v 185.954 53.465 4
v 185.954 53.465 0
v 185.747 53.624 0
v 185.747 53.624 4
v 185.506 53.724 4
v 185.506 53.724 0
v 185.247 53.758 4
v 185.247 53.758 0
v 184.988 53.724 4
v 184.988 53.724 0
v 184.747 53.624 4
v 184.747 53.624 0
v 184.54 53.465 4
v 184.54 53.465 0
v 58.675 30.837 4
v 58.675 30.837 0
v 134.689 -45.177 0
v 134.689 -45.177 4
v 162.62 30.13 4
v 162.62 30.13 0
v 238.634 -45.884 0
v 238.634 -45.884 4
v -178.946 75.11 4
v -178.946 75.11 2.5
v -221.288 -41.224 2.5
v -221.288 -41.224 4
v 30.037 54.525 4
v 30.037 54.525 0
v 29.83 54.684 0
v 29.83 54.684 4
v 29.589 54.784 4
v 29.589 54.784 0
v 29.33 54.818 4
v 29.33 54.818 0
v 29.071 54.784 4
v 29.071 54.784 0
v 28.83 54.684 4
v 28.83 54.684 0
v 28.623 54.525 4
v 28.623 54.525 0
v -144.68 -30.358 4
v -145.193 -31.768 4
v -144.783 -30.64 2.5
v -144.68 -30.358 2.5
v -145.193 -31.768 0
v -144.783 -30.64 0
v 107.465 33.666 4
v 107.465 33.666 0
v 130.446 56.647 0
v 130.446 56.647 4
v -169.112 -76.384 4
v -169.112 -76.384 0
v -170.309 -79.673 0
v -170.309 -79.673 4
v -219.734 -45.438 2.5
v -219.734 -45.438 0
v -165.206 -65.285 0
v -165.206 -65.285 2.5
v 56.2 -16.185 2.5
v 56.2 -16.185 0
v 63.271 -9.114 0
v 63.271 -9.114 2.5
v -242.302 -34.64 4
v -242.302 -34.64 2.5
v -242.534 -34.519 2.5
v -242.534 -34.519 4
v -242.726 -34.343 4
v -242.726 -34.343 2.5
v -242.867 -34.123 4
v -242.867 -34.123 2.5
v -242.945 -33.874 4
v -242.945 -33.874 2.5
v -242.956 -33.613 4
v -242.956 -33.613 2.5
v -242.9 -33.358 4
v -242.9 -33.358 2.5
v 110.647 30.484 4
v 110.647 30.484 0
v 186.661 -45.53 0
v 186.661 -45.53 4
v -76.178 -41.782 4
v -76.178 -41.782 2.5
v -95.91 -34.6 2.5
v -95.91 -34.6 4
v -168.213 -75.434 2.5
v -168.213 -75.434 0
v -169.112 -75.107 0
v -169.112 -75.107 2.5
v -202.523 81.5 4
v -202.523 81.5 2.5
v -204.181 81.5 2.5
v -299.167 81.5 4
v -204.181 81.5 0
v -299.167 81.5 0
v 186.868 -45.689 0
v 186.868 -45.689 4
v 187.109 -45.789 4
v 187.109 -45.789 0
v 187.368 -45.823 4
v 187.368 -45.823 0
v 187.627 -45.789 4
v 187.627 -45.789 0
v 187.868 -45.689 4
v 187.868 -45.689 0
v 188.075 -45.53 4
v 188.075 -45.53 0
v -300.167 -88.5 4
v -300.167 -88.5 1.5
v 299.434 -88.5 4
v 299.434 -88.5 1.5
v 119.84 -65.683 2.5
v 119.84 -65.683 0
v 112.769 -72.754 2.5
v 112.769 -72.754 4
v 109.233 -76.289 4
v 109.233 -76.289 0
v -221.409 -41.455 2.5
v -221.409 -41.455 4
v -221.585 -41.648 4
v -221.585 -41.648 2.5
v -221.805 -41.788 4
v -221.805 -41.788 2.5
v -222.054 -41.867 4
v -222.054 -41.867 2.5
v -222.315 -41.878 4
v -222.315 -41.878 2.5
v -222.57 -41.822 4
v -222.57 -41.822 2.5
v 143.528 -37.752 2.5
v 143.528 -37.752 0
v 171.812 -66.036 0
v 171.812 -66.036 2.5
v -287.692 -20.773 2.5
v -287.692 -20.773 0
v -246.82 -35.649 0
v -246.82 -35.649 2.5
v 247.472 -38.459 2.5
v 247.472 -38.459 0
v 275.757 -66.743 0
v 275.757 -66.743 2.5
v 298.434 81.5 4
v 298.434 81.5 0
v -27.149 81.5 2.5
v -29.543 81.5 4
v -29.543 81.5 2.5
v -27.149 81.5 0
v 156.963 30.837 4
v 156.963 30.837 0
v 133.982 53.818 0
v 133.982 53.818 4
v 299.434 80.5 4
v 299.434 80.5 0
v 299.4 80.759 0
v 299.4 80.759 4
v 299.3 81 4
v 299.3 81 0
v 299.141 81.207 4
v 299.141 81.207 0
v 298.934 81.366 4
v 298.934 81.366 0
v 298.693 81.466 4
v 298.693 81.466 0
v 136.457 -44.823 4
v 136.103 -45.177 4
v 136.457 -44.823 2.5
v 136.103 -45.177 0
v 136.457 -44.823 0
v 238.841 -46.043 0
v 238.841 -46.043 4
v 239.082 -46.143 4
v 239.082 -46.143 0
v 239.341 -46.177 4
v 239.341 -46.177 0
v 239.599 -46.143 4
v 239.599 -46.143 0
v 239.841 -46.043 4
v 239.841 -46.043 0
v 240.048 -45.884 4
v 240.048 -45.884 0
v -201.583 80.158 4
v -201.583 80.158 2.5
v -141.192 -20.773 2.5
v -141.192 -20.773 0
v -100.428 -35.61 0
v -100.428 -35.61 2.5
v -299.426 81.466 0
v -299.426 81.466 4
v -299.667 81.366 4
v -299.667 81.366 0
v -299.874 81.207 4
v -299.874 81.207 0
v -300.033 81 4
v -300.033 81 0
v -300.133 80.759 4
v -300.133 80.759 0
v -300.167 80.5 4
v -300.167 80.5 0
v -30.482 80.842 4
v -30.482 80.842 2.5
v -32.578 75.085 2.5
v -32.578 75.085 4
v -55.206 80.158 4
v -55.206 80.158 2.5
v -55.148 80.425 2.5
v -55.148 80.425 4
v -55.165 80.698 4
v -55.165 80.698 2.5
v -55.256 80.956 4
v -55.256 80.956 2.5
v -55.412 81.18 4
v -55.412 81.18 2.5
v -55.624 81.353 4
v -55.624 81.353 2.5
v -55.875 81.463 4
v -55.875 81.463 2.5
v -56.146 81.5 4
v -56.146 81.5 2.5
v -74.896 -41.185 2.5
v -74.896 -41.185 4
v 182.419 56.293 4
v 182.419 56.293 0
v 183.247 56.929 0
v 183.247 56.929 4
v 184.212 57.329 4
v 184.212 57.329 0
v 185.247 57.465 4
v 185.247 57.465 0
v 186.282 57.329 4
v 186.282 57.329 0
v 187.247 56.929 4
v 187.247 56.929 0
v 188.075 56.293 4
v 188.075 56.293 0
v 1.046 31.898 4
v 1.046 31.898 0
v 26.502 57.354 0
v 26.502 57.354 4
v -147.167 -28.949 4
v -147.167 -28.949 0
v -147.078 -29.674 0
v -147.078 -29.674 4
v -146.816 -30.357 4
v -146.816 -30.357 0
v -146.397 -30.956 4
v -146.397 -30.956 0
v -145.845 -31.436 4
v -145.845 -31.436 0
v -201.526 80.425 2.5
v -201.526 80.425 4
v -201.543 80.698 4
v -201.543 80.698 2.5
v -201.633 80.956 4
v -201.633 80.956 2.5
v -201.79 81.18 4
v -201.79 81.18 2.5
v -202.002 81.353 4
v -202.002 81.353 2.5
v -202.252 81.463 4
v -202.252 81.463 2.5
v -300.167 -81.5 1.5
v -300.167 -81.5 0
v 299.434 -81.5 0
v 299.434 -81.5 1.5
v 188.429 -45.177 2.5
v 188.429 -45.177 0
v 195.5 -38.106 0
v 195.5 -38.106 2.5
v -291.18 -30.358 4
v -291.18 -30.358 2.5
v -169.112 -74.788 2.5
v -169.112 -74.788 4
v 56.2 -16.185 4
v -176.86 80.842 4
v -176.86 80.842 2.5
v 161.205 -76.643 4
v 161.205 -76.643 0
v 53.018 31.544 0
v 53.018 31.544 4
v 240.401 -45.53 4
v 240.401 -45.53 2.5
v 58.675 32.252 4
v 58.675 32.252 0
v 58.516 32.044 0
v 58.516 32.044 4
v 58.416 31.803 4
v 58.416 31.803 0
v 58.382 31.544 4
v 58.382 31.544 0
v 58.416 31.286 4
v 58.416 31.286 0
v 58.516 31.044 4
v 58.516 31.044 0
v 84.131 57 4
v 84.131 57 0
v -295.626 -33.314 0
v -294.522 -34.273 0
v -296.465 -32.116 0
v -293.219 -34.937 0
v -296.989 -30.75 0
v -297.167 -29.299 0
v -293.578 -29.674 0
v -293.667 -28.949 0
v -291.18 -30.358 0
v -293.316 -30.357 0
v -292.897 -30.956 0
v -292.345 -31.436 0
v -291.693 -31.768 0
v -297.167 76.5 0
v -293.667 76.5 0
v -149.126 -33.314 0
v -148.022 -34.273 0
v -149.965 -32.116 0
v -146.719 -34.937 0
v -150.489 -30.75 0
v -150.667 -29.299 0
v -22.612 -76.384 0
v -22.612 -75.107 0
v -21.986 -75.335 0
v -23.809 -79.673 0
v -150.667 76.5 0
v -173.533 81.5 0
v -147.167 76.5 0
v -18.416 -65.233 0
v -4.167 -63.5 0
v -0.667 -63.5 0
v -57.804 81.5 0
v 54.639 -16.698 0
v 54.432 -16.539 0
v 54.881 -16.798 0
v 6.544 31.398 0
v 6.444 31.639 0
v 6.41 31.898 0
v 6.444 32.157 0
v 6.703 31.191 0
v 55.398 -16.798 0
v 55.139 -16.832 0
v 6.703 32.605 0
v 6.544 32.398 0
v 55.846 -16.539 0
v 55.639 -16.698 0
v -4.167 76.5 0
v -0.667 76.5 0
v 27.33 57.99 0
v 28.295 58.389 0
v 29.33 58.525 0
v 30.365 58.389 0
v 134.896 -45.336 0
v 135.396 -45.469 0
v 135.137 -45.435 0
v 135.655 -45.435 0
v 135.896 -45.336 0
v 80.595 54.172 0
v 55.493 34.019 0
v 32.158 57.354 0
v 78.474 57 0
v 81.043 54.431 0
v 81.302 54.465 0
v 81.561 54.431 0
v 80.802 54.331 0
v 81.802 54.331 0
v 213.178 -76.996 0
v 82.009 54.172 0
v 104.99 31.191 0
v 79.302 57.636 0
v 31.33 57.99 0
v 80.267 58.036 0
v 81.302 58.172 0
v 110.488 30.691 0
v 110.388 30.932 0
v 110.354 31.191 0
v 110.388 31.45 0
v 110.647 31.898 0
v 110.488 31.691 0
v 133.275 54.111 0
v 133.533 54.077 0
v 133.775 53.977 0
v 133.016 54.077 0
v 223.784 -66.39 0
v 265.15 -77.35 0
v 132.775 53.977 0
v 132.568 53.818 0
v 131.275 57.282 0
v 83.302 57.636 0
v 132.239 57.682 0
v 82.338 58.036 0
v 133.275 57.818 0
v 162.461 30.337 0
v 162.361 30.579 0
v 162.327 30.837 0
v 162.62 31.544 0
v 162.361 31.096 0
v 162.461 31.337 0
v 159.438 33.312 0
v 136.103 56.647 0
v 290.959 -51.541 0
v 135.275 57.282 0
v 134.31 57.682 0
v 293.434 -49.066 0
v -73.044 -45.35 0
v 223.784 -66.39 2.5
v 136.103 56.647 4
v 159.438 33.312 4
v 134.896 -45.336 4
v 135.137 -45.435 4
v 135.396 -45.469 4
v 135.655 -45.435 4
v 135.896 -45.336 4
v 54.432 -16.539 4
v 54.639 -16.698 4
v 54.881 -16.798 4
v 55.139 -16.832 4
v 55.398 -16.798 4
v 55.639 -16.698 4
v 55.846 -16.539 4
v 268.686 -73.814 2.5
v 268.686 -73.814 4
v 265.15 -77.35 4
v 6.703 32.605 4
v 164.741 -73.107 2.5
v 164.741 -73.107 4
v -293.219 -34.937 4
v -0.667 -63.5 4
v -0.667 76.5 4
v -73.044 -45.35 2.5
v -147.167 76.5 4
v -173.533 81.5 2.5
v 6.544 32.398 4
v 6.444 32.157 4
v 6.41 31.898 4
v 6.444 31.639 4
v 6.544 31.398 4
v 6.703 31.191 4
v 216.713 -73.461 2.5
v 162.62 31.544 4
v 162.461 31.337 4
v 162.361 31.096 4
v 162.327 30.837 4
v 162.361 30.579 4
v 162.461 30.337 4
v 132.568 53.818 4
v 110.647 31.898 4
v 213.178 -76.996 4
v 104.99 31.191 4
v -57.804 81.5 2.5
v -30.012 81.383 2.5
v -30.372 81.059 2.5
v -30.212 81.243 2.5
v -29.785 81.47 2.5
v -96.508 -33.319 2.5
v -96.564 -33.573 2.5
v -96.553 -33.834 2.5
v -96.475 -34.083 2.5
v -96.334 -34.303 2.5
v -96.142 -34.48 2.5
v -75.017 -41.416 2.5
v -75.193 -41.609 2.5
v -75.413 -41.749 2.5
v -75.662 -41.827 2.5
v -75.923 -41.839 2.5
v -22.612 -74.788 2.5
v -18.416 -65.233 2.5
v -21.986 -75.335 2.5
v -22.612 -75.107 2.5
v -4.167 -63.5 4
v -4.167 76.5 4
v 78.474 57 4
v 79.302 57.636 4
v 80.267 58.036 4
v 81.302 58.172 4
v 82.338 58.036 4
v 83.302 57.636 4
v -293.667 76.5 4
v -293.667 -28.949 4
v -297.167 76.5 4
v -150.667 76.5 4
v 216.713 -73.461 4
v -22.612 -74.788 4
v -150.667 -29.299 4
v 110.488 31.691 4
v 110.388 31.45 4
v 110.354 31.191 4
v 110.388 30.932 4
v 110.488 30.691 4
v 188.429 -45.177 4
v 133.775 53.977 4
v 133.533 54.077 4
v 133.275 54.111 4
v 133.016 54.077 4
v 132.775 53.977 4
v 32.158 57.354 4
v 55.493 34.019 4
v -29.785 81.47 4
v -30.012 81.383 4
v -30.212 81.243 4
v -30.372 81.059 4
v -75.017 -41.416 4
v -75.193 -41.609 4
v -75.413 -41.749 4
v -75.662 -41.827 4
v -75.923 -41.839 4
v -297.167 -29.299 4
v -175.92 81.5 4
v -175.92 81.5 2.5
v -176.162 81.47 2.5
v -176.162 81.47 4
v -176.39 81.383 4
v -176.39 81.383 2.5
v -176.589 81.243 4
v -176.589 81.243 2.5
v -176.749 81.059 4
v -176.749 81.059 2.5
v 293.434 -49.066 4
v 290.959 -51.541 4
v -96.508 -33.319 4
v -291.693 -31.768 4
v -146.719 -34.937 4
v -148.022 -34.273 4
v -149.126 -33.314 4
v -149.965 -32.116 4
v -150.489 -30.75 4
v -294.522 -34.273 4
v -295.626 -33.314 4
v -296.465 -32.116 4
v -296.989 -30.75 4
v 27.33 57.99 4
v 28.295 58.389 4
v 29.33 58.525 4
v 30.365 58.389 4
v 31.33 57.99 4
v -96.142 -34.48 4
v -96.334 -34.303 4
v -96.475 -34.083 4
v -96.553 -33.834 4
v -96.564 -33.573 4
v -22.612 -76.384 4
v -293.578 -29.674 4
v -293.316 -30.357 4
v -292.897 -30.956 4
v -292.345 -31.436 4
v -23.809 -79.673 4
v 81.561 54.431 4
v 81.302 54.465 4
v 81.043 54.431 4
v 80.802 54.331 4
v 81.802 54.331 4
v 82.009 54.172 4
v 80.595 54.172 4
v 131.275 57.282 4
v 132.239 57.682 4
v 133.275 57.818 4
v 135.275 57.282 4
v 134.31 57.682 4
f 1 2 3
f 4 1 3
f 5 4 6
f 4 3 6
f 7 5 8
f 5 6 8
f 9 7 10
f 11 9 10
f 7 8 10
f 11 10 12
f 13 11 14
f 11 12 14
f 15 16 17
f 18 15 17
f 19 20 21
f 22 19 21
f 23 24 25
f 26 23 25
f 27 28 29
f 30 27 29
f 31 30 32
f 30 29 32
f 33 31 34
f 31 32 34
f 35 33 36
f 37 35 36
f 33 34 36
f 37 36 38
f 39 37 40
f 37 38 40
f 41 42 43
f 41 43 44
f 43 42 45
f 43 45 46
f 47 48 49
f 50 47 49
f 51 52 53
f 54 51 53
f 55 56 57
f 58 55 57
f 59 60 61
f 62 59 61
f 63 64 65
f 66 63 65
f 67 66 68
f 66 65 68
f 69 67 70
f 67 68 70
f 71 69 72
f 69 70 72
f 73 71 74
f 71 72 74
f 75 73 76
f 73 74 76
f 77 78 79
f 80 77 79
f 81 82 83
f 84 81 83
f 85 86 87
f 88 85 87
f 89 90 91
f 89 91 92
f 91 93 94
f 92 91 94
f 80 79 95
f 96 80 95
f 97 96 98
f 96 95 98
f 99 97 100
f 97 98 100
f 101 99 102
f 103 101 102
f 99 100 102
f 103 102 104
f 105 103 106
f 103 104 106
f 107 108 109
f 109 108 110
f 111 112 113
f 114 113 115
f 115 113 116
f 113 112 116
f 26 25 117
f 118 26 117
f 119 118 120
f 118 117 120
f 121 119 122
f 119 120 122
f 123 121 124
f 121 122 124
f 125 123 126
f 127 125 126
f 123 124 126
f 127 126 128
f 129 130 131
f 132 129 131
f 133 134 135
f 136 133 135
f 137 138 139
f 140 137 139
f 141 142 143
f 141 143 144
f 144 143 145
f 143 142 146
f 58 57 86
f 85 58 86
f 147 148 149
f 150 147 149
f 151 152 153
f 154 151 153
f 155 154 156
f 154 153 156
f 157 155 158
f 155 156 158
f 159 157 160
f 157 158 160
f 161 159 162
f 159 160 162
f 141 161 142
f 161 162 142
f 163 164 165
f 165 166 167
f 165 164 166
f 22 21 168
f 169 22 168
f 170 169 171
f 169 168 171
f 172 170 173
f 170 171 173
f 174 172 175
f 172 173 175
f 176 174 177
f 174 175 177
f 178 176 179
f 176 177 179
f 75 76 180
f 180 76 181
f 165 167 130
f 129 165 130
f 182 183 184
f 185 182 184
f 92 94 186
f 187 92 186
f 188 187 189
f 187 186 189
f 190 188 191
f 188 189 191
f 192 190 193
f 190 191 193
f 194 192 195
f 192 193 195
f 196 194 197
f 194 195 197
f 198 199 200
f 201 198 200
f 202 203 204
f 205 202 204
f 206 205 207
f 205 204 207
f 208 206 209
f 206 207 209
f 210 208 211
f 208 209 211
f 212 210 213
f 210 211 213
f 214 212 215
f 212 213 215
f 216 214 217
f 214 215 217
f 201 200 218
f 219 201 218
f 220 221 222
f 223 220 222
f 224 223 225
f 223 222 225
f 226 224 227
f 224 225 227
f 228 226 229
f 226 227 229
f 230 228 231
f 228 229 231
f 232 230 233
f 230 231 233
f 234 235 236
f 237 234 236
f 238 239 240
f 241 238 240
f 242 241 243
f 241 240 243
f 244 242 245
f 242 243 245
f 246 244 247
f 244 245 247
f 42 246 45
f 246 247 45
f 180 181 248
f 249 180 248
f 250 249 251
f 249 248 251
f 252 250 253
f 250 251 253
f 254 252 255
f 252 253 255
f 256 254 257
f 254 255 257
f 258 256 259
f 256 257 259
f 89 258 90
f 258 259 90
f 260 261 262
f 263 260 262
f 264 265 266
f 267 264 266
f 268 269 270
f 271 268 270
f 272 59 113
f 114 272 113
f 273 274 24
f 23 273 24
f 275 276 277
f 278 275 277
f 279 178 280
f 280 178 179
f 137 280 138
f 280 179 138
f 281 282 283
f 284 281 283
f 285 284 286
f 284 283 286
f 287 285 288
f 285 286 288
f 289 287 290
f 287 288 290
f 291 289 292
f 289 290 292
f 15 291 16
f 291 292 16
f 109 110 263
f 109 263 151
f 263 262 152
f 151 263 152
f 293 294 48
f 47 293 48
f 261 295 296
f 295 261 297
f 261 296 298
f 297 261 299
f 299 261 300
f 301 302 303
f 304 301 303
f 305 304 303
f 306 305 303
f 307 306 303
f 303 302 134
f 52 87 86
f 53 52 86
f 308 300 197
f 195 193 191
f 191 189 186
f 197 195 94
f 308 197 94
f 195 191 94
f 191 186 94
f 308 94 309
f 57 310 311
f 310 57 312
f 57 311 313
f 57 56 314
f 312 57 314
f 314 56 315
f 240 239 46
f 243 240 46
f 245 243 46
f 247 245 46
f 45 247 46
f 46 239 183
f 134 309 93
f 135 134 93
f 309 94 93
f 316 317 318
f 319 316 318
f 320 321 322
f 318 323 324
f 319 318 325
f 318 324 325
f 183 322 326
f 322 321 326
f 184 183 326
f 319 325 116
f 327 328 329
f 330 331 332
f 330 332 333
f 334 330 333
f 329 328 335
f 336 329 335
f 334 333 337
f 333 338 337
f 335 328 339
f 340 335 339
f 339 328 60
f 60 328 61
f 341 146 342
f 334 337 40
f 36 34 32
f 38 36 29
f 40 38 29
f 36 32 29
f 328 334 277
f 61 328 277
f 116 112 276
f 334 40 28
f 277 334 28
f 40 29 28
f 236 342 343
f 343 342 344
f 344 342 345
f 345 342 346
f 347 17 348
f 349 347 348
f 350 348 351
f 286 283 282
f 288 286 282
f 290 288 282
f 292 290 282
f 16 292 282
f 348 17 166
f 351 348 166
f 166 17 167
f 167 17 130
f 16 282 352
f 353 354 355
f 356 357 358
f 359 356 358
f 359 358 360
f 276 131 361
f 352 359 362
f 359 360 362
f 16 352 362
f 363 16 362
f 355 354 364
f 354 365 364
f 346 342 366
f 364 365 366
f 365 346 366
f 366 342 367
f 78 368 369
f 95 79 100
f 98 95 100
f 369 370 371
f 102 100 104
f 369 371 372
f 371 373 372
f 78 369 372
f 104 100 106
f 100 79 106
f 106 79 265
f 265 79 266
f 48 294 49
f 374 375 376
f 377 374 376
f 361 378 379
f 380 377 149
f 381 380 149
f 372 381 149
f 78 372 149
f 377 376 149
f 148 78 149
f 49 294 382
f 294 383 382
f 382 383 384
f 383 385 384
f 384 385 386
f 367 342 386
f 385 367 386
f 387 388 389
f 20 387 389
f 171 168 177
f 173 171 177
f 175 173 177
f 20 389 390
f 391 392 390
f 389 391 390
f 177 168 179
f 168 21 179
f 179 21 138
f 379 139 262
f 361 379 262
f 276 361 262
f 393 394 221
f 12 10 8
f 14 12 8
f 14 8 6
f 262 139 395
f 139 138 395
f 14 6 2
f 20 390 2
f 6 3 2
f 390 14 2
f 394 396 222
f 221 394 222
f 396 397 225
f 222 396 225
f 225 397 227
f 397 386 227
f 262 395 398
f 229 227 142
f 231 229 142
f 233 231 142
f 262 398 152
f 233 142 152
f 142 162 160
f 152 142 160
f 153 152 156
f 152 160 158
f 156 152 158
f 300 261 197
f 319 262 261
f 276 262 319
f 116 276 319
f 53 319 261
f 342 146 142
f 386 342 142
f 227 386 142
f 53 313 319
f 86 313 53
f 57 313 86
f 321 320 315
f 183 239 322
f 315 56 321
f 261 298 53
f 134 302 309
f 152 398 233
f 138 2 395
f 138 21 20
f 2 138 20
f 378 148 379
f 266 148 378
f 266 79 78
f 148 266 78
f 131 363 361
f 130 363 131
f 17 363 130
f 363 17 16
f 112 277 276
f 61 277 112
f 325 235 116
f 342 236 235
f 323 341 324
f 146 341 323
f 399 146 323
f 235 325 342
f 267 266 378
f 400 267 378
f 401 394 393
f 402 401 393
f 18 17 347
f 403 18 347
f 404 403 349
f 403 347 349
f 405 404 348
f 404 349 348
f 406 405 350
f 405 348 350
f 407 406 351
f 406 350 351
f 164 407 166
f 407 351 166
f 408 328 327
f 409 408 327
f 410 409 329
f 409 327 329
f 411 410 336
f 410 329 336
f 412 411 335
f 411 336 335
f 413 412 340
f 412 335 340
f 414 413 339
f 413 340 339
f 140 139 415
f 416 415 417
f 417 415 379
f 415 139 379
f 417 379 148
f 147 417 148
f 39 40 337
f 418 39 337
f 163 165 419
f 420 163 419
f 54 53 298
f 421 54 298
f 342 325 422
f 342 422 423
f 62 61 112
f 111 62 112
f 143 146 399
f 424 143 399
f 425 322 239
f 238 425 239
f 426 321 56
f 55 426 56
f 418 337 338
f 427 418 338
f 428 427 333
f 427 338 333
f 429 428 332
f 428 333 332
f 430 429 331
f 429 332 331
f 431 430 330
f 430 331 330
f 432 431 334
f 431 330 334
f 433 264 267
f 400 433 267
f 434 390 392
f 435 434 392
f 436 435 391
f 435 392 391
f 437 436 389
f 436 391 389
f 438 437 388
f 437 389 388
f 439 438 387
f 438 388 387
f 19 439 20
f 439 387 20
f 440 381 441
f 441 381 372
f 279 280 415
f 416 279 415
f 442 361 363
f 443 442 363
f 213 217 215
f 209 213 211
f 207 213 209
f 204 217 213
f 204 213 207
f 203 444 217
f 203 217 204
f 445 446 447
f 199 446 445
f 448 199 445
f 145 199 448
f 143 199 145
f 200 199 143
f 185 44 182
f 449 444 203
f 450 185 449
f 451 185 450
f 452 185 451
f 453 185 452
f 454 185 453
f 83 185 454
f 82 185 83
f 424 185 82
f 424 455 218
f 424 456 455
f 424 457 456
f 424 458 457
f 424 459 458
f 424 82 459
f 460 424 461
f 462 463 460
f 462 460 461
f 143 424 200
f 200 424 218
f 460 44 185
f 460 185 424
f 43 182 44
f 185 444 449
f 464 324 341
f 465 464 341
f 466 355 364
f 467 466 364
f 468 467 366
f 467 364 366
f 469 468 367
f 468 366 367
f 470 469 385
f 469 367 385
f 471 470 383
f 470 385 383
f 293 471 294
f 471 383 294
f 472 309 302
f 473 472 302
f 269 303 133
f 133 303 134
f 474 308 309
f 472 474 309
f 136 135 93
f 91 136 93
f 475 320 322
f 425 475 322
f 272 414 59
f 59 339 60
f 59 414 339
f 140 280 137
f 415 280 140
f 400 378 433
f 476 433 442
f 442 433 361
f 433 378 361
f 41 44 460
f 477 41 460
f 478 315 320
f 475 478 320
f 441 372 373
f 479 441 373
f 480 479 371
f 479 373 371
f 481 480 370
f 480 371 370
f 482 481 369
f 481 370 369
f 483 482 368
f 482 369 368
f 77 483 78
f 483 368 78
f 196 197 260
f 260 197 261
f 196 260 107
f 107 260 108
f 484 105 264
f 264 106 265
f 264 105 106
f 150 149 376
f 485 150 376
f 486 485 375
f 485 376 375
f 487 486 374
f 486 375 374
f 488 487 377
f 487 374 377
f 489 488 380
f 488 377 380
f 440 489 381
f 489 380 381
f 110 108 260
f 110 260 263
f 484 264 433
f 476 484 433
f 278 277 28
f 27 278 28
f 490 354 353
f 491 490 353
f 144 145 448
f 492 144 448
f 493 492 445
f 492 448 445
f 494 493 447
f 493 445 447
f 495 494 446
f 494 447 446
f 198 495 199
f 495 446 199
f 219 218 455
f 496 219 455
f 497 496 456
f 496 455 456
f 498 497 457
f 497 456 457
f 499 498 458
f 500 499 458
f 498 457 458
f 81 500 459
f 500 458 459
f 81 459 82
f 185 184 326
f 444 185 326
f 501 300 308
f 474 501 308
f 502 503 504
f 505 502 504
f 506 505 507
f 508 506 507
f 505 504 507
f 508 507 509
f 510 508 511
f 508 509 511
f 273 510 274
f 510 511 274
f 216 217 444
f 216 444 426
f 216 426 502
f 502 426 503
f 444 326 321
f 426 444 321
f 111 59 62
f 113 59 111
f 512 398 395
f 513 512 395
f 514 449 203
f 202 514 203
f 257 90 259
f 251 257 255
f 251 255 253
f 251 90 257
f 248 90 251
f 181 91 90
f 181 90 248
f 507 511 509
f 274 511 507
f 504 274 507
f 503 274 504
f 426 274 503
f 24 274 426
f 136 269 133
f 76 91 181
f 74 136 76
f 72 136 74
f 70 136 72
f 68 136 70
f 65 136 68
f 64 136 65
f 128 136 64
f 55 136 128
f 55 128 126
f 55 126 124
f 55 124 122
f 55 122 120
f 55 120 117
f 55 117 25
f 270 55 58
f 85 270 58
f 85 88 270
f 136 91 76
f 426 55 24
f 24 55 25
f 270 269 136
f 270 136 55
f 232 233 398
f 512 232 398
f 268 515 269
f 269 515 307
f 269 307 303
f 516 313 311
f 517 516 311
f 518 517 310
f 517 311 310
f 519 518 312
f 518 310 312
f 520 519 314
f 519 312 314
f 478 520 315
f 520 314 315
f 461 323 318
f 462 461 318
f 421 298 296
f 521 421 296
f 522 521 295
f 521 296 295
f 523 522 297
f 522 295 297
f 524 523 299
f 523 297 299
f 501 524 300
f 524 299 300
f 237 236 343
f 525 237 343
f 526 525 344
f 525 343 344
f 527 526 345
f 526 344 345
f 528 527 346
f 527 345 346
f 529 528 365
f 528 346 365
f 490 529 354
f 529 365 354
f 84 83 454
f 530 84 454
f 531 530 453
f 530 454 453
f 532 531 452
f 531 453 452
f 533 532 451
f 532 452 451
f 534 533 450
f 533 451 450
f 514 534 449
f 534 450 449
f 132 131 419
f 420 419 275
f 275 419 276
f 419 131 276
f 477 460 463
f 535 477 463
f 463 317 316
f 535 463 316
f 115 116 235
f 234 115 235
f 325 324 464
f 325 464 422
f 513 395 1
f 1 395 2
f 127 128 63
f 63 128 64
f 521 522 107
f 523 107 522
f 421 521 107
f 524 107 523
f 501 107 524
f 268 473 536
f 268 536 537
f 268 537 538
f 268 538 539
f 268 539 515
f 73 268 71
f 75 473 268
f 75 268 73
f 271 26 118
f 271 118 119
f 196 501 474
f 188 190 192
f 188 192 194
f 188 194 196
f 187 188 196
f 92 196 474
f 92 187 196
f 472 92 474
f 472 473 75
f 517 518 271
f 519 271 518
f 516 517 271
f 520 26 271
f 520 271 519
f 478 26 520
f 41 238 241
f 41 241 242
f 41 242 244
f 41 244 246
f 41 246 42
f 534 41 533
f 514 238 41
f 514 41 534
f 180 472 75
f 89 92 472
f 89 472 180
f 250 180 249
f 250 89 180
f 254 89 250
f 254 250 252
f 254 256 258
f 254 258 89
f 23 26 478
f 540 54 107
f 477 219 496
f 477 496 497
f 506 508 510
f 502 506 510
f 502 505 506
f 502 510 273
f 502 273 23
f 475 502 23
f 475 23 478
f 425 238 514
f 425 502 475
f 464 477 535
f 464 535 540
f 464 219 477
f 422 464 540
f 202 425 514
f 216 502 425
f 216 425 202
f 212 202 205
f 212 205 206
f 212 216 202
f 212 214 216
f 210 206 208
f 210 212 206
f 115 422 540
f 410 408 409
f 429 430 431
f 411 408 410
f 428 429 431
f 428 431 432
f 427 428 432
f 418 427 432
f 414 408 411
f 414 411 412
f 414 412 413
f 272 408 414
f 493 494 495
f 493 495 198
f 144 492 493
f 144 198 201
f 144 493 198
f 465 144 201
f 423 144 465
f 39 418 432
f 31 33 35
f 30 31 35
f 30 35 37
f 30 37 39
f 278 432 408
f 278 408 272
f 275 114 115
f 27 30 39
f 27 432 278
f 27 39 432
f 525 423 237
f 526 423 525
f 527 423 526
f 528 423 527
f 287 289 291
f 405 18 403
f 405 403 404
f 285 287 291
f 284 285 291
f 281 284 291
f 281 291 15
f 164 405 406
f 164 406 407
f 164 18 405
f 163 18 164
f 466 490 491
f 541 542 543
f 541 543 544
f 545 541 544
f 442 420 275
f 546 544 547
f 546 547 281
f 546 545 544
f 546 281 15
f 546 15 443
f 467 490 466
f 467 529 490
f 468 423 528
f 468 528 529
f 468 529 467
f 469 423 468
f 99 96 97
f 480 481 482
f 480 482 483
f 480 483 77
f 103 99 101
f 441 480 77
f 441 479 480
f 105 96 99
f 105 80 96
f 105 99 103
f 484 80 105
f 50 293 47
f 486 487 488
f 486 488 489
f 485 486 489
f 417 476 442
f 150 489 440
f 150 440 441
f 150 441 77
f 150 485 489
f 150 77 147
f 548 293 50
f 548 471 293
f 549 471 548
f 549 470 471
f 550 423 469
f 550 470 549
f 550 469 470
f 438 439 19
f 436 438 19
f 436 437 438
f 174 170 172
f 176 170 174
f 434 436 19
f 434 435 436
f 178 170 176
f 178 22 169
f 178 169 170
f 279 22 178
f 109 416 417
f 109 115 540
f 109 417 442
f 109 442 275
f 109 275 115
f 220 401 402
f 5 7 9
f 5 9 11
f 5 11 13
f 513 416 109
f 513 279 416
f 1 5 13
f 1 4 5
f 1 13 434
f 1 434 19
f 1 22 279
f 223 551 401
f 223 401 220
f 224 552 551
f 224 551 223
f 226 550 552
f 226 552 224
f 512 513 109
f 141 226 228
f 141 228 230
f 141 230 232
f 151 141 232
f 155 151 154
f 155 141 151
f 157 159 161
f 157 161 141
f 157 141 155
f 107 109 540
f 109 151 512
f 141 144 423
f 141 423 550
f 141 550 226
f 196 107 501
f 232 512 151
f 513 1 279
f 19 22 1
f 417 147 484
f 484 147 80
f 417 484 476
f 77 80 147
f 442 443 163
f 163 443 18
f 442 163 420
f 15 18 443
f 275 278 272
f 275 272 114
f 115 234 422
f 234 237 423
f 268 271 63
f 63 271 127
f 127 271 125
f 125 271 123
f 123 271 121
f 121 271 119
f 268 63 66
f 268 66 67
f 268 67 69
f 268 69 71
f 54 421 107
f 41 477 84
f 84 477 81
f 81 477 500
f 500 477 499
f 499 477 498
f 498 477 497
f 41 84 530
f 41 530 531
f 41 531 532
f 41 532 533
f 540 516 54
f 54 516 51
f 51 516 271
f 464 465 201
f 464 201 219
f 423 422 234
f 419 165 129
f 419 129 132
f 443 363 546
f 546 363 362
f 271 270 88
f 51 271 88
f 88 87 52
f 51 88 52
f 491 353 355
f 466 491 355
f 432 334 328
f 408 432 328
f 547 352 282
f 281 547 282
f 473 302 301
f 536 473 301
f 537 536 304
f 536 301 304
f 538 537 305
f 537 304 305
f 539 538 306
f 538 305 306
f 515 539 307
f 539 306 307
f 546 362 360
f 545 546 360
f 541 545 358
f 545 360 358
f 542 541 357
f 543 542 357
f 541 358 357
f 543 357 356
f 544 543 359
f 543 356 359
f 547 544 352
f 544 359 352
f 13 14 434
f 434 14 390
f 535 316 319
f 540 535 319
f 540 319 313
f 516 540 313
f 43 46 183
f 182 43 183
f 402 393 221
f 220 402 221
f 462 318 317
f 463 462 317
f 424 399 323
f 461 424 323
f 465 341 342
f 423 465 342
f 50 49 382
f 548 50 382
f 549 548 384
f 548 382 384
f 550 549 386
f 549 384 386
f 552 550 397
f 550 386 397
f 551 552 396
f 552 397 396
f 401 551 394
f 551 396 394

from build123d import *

# Parameters (mm, degrees)
F0_W     = 3.5
F0_H     = 140
F1_DEPTH = 4
F3_DEPTH = 2.5
F2_W     = 599.6014092535
F2_H     = 7
F4_DEPTH = 1.5


# Not quite as in the source:
# - a feature names something its author has since deleted; it is built from what else it names


with BuildPart() as f1:
    # F0 (on Top) → F1 (new body)
    with BuildSketch(Plane.XY):
        with BuildLine():
            Line((-300.1670946785, -88.5), (299.4343145751, -88.5))
            Line((299.4343145751, -88.5), (299.4343145751, 80.5))
            ThreePointArc((299.4343145751, 80.5), (299.1414213562, 81.2071067812), (298.4343145751, 81.5))
            Line((298.4343145751, 81.5), (-29.5426009536, 81.5))
            ThreePointArc((-29.5426009536, 81.5), (-30.1161773899, 81.3191520443), (-30.4822935744, 80.8420201433))
            Line((-30.4822935744, 80.8420201433), (-32.577653202, 75.0850668809))
            Line((-32.577653202, 75.0850668809), (-74.89635139, -41.1846008115))
            ThreePointArc((-74.89635139, -41.1846008115), (-75.413425749, -41.7488884552), (-76.1780641541, -41.7822732889))
            Line((-76.1780641541, -41.7822732889), (-95.9102779047, -34.6003348275))
            ThreePointArc((-95.9102779047, -34.6003348275), (-96.4745655484, -34.0832604685), (-96.5079503821, -33.3186220634))
            Line((-96.5079503821, -33.3186220634), (-55.2058449976, 80.1579798567))
            ThreePointArc((-55.2058449976, 80.1579798567), (-55.3263855741, 81.0735764364), (-56.1455376183, 81.5))
            Line((-56.1455376183, 81.5), (-175.9202302026, 81.5))
            ThreePointArc((-175.9202302026, 81.5), (-176.4938066389, 81.3191520443), (-176.8599228233, 80.8420201433))
            Line((-176.8599228233, 80.8420201433), (-178.9462015538, 75.1100164406))
            Line((-178.9462015538, 75.1100164406), (-221.2882952976, -41.2239300127))
            ThreePointArc((-221.2882952976, -41.2239300127), (-221.8053696566, -41.7882176564), (-222.5700080617, -41.8216024902))
            Line((-222.5700080617, -41.8216024902), (-242.3022218123, -34.6396640288))
            ThreePointArc((-242.3022218123, -34.6396640288), (-242.866509456, -34.1225896697), (-242.8998942897, -33.3579512647))
            Line((-242.8998942897, -33.3579512647), (-201.5834742465, 80.1579798567))
            ThreePointArc((-201.5834742465, 80.1579798567), (-201.704014823, 81.0735764364), (-202.5231668673, 81.5))
            Line((-202.5231668673, 81.5), (-299.1670946785, 81.5))
            ThreePointArc((-299.1670946785, 81.5), (-299.8742014597, 81.2071067812), (-300.1670946785, 80.5))
            Line((-300.1670946785, 80.5), (-300.1670946785, -88.5))
        make_face()
        with BuildLine():
            ThreePointArc((182.4185499288, 56.2932249718), (185.2469770535, 57.4647978471), (188.0754041783, 56.2932249718))
            Line((188.0754041783, 56.2932249718), (293.4343145751, -49.0656854249))
            Line((293.4343145751, -49.0656854249), (290.9594408409, -51.5405591591))
            Line((290.9594408409, -51.5405591591), (185.9540838347, 53.4647978471))
            ThreePointArc((185.9540838347, 53.4647978471), (185.2469770535, 53.7576910659), (184.5398702723, 53.4647978471))
            Line((184.5398702723, 53.4647978471), (162.6195600555, 31.5444876303))
            ThreePointArc((162.6195600555, 31.5444876303), (162.3266668367, 30.8373808491), (162.6195600555, 30.1302740679))
            Line((162.6195600555, 30.1302740679), (238.6335390331, -45.8837049096))
            ThreePointArc((238.6335390331, -45.8837049096), (239.3406458143, -46.1765981284), (240.0477525955, -45.8837049096))
            Line((240.0477525955, -45.8837049096), (240.4013059861, -45.530151519))
            Line((240.4013059861, -45.530151519), (268.6855772335, -73.8144227665))
            Line((268.6855772335, -73.8144227665), (267.6249170617, -74.8750829383))
            Line((267.6249170617, -74.8750829383), (265.1500433276, -77.3499566724))
            Line((265.1500433276, -77.3499566724), (156.962705806, 30.8373808491))
            Line((156.962705806, 30.8373808491), (133.9817354175, 53.8183512377))
            ThreePointArc((133.9817354175, 53.8183512377), (133.2746286363, 54.1112444565), (132.5675218551, 53.8183512377))
            Line((132.5675218551, 53.8183512377), (110.6472116383, 31.8980410209))
            ThreePointArc((110.6472116383, 31.8980410209), (110.3543184195, 31.1909342397), (110.6472116383, 30.4838274585))
            Line((110.6472116383, 30.4838274585), (186.6611906159, -45.530151519))
            ThreePointArc((186.6611906159, -45.530151519), (187.3682973971, -45.8230447378), (188.0754041783, -45.530151519))
            Line((188.0754041783, -45.530151519), (188.4289575688, -45.1765981284))
            Line((188.4289575688, -45.1765981284), (216.7132288163, -73.4608693759))
            Line((216.7132288163, -73.4608693759), (215.6525686445, -74.5215295477))
            Line((215.6525686445, -74.5215295477), (213.1776949104, -76.9964032818))
            Line((213.1776949104, -76.9964032818), (104.9903573888, 31.1909342397))
            Line((104.9903573888, 31.1909342397), (82.0093870003, 54.1719046283))
            ThreePointArc((82.0093870003, 54.1719046283), (81.3022802191, 54.4647978471), (80.5951734379, 54.1719046283))
            Line((80.5951734379, 54.1719046283), (58.6748632211, 32.2515944115))
            ThreePointArc((58.6748632211, 32.2515944115), (58.3819700023, 31.5444876303), (58.6748632211, 30.8373808491))
            Line((58.6748632211, 30.8373808491), (134.6888421987, -45.1765981284))
            ThreePointArc((134.6888421987, -45.1765981284), (135.3959489799, -45.4694913472), (136.103055761, -45.1765981284))
            Line((136.103055761, -45.1765981284), (136.4566091516, -44.8230447378))
            Line((136.4566091516, -44.8230447378), (164.7408803991, -73.1073159853))
            Line((164.7408803991, -73.1073159853), (163.6802202273, -74.1679761571))
            Line((163.6802202273, -74.1679761571), (161.2053464932, -76.6428498912))
            Line((161.2053464932, -76.6428498912), (53.0180089716, 31.5444876303))
            Line((53.0180089716, 31.5444876303), (30.0370385831, 54.5254580189))
            ThreePointArc((30.0370385831, 54.5254580189), (29.3299318019, 54.8183512377), (28.6228250207, 54.5254580189))
            Line((28.6228250207, 54.5254580189), (6.7025148039, 32.6051478021))
            ThreePointArc((6.7025148039, 32.6051478021), (6.4096215851, 31.8980410209), (6.7025148039, 31.1909342397))
            Line((6.7025148039, 31.1909342397), (54.432222534, -16.5387734904))
            ThreePointArc((54.432222534, -16.5387734904), (55.1393293152, -16.8316667092), (55.8464360964, -16.5387734904))
            Line((55.8464360964, -16.5387734904), (56.199989487, -16.1852200998))
            Line((56.199989487, -16.1852200998), (112.7685319819, -72.7537625947))
            Line((112.7685319819, -72.7537625947), (111.7078718101, -73.8144227665))
            Line((111.7078718101, -73.8144227665), (109.232998076, -76.2892965006))
            Line((109.232998076, -76.2892965006), (1.0456605544, 31.8980410209))
            Line((1.0456605544, 31.8980410209), (26.5015046771, 57.3538851436))
            ThreePointArc((26.5015046771, 57.3538851436), (29.3299318019, 58.5254580189), (32.1583589266, 57.3538851436))
            Line((32.1583589266, 57.3538851436), (55.4928827058, 34.0193613645))
            Line((55.4928827058, 34.0193613645), (78.4738530943, 57.000331753))
            ThreePointArc((78.4738530943, 57.000331753), (81.3022802191, 58.1719046283), (84.1307073438, 57.000331753))
            Line((84.1307073438, 57.000331753), (107.465231123, 33.6658079739))
            Line((107.465231123, 33.6658079739), (130.4462015116, 56.6467783624))
            ThreePointArc((130.4462015116, 56.6467783624), (133.2746286363, 57.8183512377), (136.103055761, 56.6467783624))
            Line((136.103055761, 56.6467783624), (159.4375795402, 33.3122545833))
            Line((159.4375795402, 33.3122545833), (182.4185499288, 56.2932249718))
        make_face(mode=Mode.SUBTRACT)
        with BuildLine():
            Line((-297.1670946785, -29.2987547707), (-297.1670946785, 76.5))
            Line((-297.1670946785, 76.5), (-293.6670946785, 76.5))
            Line((-293.6670946785, 76.5), (-293.6670946785, -28.9486510016))
            ThreePointArc((-293.6670946785, -28.9486510016), (-293.1245508114, -30.6693803107), (-291.6931551085, -31.767728864))
            Line((-291.6931551085, -31.767728864), (-291.1801248935, -30.3581899328))
            Line((-291.1801248935, -30.3581899328), (-247.9542643373, -46.0911165258))
            Line((-247.9542643373, -46.0911165258), (-216.0047152306, -57.7198013989))
            Line((-216.0047152306, -57.7198013989), (-169.1115203708, -74.7875285175))
            Line((-169.1115203708, -74.7875285175), (-169.1115203708, -76.3837951762))
            Line((-169.1115203708, -76.3837951762), (-170.3085908724, -79.672719349))
            Line((-170.3085908724, -79.672719349), (-293.2192155384, -34.9369104955))
            ThreePointArc((-293.2192155384, -34.9369104955), (-296.0820069442, -32.7402133888), (-297.1670946785, -29.2987547707))
        make_face(mode=Mode.SUBTRACT)
        with BuildLine():
            Line((-150.6670946785, -29.2987547707), (-150.6670946785, 76.5))
            Line((-150.6670946785, 76.5), (-147.1670946785, 76.5))
            Line((-147.1670946785, 76.5), (-147.1670946785, -28.9486510016))
            ThreePointArc((-147.1670946785, -28.9486510016), (-146.6245508114, -30.6693803107), (-145.1931551085, -31.767728864))
            Line((-145.1931551085, -31.767728864), (-144.6801248935, -30.3581899328))
            Line((-144.6801248935, -30.3581899328), (-101.4542643373, -46.0911165258))
            Line((-101.4542643373, -46.0911165258), (-69.5047152306, -57.7198013989))
            Line((-69.5047152306, -57.7198013989), (-22.6115203708, -74.7875285175))
            Line((-22.6115203708, -74.7875285175), (-22.6115203708, -76.3837951762))
            Line((-22.6115203708, -76.3837951762), (-23.8085908724, -79.672719349))
            Line((-23.8085908724, -79.672719349), (-146.7192155384, -34.9369104955))
            ThreePointArc((-146.7192155384, -34.9369104955), (-149.5820069442, -32.7402133888), (-150.6670946785, -29.2987547707))
        make_face(mode=Mode.SUBTRACT)
        with Locations((-2.4170946785, 6.5)):
            Rectangle(F0_W, F0_H, mode=Mode.SUBTRACT)
    extrude(amount=F1_DEPTH)

    # F2 (on face) → F3 (cut)
    with BuildSketch(Plane(origin=(0, 0, 0), x_dir=(1, 0, 0), z_dir=(0, 0, -1))):
        Polygon((275.7566450454, 66.7433549546), (268.6855772335, 73.8144227665), (240.4013059861, 45.530151519), (247.4723737979, 38.4590837072), align=None)
        Polygon((216.7132288163, 73.4608693759), (188.4289575688, 45.1765981284), (195.5000253807, 38.1055303166), (223.7842966282, 66.389801564), align=None)
        Polygon((164.7408803991, 73.1073159853), (136.4566091516, 44.8230447378), (143.5276769635, 37.751976926), (171.811948211, 66.0362481734), align=None)
        Polygon((119.8395997938, 65.6826947828), (112.7685319819, 72.7537625947), (56.199989487, 16.1852200998), (63.2710572988, 9.1141522879), align=None)
        with BuildLine():
            Line((-26.1847247522, -84.1663356758), (-27.1494019864, -81.5))
            Line((-27.1494019864, -81.5), (-29.5426009536, -81.5))
            ThreePointArc((-29.5426009536, -81.5), (-30.1161773899, -81.3191520443), (-30.4822935744, -80.8420201433))
            Line((-30.4822935744, -80.8420201433), (-74.89635139, 41.1846008115))
            ThreePointArc((-74.89635139, 41.1846008115), (-75.413425749, 41.7488884552), (-76.1780641541, 41.7822732889))
            Line((-76.1780641541, 41.7822732889), (-95.9102779047, 34.6003348275))
            ThreePointArc((-95.9102779047, 34.6003348275), (-96.4745655484, 34.0832604685), (-96.5079503821, 33.3186220634))
            Line((-96.5079503821, 33.3186220634), (-55.2058449976, -80.1579798567))
            ThreePointArc((-55.2058449976, -80.1579798567), (-55.3263855741, -81.0735764364), (-56.1455376183, -81.5))
            Line((-56.1455376183, -81.5), (-57.8035051482, -81.5))
            Line((-57.8035051482, -81.5), (-56.1411243122, -86.0673538194))
            Line((-56.1411243122, -86.0673538194), (-53.1341079256, -84.9728893607))
            Line((-53.1341079256, -84.9728893607), (-96.2260425959, 33.4212281064))
            Line((-96.2260425959, 33.4212281064), (-75.1769278903, 41.0824793169))
            Line((-75.1769278903, 41.0824793169), (-29.193835551, -85.2550285621))
            Line((-29.193835551, -85.2550285621), (-26.1847247522, -84.1663356758))
        make_face()
        with BuildLine():
            Line((-29.5426009536, -81.5), (-27.1494019864, -81.5))
            Line((-27.1494019864, -81.5), (-73.0435823042, 45.3499825234))
            Line((-73.0435823042, 45.3499825234), (-18.4155032039, 65.2329772711))
            Line((-18.4155032039, 65.2329772711), (-21.9858379993, 75.3345116245))
            Line((-21.9858379993, 75.3345116245), (-22.6115203708, 75.1067818652))
            Line((-22.6115203708, 75.1067818652), (-22.6115203708, 74.7875285175))
            Line((-22.6115203708, 74.7875285175), (-144.6801248935, 30.3581899328))
            Line((-144.6801248935, 30.3581899328), (-144.7827309416, 30.6400977331))
            Line((-144.7827309416, 30.6400977331), (-144.7829091425, 30.6400328733))
            Line((-144.7829091425, 30.6400328733), (-141.1916976375, 20.7732603551))
            Line((-141.1916976375, 20.7732603551), (-100.4280628419, 35.6100100293))
            Line((-100.4280628419, 35.6100100293), (-57.8035051482, -81.5))
            Line((-57.8035051482, -81.5), (-56.1455376183, -81.5))
            ThreePointArc((-56.1455376183, -81.5), (-55.3263855741, -81.0735764364), (-55.2058449976, -80.1579798567))
            Line((-55.2058449976, -80.1579798567), (-96.5079503821, 33.3186220634))
            ThreePointArc((-96.5079503821, 33.3186220634), (-96.4745655484, 34.0832604685), (-95.9102779047, 34.6003348275))
            Line((-95.9102779047, 34.6003348275), (-76.1780641541, 41.7822732889))
            ThreePointArc((-76.1780641541, 41.7822732889), (-75.413425749, 41.7488884552), (-74.89635139, 41.1846008115))
            Line((-74.89635139, 41.1846008115), (-30.4822935744, -80.8420201433))
            ThreePointArc((-30.4822935744, -80.8420201433), (-30.1161773899, -81.3191520443), (-29.5426009536, -81.5))
        make_face()
        with BuildLine():
            Line((-246.8200068386, 35.6493392141), (-204.1811344008, -81.5))
            Line((-204.1811344008, -81.5), (-202.5231668673, -81.5))
            ThreePointArc((-202.5231668673, -81.5), (-201.704014823, -81.0735764364), (-201.5834742465, -80.1579798567))
            Line((-201.5834742465, -80.1579798567), (-242.8998942897, 33.3579512647))
            ThreePointArc((-242.8998942897, 33.3579512647), (-242.866509456, 34.1225896697), (-242.3022218123, 34.6396640288))
            Line((-242.3022218123, 34.6396640288), (-222.5700080617, 41.8216024902))
            ThreePointArc((-222.5700080617, 41.8216024902), (-221.8053696566, 41.7882176564), (-221.2882952976, 41.2239300127))
            Line((-221.2882952976, 41.2239300127), (-176.8599228233, -80.8420201433))
            ThreePointArc((-176.8599228233, -80.8420201433), (-176.4938066389, -81.3191520443), (-175.9202302026, -81.5))
            Line((-175.9202302026, -81.5), (-173.5328145535, -81.5))
            Line((-173.5328145535, -81.5), (-219.7344579026, 45.4379718434))
            Line((-219.7344579026, 45.4379718434), (-165.206104517, 65.2846693993))
            Line((-165.206104517, 65.2846693993), (-168.2128599899, 75.4338674786))
            Line((-168.2128599899, 75.4338674786), (-169.1115203708, 75.1067818492))
            Line((-169.1115203708, 75.1067818492), (-169.1115203708, 74.7875285175))
            Line((-169.1115203708, 74.7875285175), (-291.1801248935, 30.3581899328))
            Line((-291.1801248935, 30.3581899328), (-287.6915194316, 20.7733252008))
            Line((-287.6915194316, 20.7733252008), (-246.8200068386, 35.6493392141))
        make_face()
    extrude(amount=-F3_DEPTH, mode=Mode.SUBTRACT)

    # F2 (on face) → F4 (cut)
    with BuildSketch(Plane(origin=(0, 0, 0), x_dir=(1, 0, 0), z_dir=(0, 0, -1))):
        with Locations((-0.3663900517, 85)):
            Rectangle(F2_W, F2_H)
    extrude(amount=-F4_DEPTH, mode=Mode.SUBTRACT)


solid = f1.part
